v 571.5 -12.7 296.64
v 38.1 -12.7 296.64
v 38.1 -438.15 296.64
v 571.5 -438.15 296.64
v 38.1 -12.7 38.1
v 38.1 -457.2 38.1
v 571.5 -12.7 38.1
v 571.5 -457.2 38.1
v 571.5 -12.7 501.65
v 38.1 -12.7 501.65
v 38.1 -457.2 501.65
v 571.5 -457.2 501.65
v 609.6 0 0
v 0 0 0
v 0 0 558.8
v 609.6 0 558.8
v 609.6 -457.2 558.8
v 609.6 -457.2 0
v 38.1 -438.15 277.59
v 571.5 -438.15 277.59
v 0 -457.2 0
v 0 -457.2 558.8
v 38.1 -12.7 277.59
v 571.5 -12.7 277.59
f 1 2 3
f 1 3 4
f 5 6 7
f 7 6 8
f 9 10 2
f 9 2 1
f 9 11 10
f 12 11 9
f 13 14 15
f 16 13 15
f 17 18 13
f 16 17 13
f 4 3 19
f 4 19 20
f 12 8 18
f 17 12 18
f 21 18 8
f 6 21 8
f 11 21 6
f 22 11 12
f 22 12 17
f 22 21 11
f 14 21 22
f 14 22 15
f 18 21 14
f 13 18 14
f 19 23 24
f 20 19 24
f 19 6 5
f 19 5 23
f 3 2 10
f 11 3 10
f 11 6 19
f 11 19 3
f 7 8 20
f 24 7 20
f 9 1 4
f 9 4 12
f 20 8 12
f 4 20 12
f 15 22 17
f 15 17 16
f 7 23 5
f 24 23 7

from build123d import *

# Parameters (mm, degrees)
F0_W     = 457.2
F0_H     = 558.8
F1_DEPTH = 609.6
F2_W     = 533.4
F2_H     = 463.55
F3_DEPTH = 444.5
F4_W     = 533.4
F4_H     = 19.05
F5_DEPTH = 425.45


# Not quite as in the source:
# - a feature names something its author has since deleted; it is built from what else it names


with BuildPart() as f1:
    # F0 (on Right) → F1 (new body)
    with BuildSketch(Plane.YZ):
        with Locations((-228.6, 279.4)):
            Rectangle(F0_W, F0_H)
    extrude(amount=F1_DEPTH)

    # F2 (on face) → F3 (cut)
    with BuildSketch(Plane.XZ.offset(457.2)):
        with Locations((304.8, 269.875)):
            Rectangle(F2_W, F2_H)
    extrude(amount=-F3_DEPTH, mode=Mode.SUBTRACT)

    # F4 (on face) → F5 (join)
    with BuildSketch(Plane.XZ.offset(12.7)):
        with Locations((304.8, 287.1150959969)):
            Rectangle(F4_W, F4_H)
    extrude(amount=F5_DEPTH)


solid = f1.part
